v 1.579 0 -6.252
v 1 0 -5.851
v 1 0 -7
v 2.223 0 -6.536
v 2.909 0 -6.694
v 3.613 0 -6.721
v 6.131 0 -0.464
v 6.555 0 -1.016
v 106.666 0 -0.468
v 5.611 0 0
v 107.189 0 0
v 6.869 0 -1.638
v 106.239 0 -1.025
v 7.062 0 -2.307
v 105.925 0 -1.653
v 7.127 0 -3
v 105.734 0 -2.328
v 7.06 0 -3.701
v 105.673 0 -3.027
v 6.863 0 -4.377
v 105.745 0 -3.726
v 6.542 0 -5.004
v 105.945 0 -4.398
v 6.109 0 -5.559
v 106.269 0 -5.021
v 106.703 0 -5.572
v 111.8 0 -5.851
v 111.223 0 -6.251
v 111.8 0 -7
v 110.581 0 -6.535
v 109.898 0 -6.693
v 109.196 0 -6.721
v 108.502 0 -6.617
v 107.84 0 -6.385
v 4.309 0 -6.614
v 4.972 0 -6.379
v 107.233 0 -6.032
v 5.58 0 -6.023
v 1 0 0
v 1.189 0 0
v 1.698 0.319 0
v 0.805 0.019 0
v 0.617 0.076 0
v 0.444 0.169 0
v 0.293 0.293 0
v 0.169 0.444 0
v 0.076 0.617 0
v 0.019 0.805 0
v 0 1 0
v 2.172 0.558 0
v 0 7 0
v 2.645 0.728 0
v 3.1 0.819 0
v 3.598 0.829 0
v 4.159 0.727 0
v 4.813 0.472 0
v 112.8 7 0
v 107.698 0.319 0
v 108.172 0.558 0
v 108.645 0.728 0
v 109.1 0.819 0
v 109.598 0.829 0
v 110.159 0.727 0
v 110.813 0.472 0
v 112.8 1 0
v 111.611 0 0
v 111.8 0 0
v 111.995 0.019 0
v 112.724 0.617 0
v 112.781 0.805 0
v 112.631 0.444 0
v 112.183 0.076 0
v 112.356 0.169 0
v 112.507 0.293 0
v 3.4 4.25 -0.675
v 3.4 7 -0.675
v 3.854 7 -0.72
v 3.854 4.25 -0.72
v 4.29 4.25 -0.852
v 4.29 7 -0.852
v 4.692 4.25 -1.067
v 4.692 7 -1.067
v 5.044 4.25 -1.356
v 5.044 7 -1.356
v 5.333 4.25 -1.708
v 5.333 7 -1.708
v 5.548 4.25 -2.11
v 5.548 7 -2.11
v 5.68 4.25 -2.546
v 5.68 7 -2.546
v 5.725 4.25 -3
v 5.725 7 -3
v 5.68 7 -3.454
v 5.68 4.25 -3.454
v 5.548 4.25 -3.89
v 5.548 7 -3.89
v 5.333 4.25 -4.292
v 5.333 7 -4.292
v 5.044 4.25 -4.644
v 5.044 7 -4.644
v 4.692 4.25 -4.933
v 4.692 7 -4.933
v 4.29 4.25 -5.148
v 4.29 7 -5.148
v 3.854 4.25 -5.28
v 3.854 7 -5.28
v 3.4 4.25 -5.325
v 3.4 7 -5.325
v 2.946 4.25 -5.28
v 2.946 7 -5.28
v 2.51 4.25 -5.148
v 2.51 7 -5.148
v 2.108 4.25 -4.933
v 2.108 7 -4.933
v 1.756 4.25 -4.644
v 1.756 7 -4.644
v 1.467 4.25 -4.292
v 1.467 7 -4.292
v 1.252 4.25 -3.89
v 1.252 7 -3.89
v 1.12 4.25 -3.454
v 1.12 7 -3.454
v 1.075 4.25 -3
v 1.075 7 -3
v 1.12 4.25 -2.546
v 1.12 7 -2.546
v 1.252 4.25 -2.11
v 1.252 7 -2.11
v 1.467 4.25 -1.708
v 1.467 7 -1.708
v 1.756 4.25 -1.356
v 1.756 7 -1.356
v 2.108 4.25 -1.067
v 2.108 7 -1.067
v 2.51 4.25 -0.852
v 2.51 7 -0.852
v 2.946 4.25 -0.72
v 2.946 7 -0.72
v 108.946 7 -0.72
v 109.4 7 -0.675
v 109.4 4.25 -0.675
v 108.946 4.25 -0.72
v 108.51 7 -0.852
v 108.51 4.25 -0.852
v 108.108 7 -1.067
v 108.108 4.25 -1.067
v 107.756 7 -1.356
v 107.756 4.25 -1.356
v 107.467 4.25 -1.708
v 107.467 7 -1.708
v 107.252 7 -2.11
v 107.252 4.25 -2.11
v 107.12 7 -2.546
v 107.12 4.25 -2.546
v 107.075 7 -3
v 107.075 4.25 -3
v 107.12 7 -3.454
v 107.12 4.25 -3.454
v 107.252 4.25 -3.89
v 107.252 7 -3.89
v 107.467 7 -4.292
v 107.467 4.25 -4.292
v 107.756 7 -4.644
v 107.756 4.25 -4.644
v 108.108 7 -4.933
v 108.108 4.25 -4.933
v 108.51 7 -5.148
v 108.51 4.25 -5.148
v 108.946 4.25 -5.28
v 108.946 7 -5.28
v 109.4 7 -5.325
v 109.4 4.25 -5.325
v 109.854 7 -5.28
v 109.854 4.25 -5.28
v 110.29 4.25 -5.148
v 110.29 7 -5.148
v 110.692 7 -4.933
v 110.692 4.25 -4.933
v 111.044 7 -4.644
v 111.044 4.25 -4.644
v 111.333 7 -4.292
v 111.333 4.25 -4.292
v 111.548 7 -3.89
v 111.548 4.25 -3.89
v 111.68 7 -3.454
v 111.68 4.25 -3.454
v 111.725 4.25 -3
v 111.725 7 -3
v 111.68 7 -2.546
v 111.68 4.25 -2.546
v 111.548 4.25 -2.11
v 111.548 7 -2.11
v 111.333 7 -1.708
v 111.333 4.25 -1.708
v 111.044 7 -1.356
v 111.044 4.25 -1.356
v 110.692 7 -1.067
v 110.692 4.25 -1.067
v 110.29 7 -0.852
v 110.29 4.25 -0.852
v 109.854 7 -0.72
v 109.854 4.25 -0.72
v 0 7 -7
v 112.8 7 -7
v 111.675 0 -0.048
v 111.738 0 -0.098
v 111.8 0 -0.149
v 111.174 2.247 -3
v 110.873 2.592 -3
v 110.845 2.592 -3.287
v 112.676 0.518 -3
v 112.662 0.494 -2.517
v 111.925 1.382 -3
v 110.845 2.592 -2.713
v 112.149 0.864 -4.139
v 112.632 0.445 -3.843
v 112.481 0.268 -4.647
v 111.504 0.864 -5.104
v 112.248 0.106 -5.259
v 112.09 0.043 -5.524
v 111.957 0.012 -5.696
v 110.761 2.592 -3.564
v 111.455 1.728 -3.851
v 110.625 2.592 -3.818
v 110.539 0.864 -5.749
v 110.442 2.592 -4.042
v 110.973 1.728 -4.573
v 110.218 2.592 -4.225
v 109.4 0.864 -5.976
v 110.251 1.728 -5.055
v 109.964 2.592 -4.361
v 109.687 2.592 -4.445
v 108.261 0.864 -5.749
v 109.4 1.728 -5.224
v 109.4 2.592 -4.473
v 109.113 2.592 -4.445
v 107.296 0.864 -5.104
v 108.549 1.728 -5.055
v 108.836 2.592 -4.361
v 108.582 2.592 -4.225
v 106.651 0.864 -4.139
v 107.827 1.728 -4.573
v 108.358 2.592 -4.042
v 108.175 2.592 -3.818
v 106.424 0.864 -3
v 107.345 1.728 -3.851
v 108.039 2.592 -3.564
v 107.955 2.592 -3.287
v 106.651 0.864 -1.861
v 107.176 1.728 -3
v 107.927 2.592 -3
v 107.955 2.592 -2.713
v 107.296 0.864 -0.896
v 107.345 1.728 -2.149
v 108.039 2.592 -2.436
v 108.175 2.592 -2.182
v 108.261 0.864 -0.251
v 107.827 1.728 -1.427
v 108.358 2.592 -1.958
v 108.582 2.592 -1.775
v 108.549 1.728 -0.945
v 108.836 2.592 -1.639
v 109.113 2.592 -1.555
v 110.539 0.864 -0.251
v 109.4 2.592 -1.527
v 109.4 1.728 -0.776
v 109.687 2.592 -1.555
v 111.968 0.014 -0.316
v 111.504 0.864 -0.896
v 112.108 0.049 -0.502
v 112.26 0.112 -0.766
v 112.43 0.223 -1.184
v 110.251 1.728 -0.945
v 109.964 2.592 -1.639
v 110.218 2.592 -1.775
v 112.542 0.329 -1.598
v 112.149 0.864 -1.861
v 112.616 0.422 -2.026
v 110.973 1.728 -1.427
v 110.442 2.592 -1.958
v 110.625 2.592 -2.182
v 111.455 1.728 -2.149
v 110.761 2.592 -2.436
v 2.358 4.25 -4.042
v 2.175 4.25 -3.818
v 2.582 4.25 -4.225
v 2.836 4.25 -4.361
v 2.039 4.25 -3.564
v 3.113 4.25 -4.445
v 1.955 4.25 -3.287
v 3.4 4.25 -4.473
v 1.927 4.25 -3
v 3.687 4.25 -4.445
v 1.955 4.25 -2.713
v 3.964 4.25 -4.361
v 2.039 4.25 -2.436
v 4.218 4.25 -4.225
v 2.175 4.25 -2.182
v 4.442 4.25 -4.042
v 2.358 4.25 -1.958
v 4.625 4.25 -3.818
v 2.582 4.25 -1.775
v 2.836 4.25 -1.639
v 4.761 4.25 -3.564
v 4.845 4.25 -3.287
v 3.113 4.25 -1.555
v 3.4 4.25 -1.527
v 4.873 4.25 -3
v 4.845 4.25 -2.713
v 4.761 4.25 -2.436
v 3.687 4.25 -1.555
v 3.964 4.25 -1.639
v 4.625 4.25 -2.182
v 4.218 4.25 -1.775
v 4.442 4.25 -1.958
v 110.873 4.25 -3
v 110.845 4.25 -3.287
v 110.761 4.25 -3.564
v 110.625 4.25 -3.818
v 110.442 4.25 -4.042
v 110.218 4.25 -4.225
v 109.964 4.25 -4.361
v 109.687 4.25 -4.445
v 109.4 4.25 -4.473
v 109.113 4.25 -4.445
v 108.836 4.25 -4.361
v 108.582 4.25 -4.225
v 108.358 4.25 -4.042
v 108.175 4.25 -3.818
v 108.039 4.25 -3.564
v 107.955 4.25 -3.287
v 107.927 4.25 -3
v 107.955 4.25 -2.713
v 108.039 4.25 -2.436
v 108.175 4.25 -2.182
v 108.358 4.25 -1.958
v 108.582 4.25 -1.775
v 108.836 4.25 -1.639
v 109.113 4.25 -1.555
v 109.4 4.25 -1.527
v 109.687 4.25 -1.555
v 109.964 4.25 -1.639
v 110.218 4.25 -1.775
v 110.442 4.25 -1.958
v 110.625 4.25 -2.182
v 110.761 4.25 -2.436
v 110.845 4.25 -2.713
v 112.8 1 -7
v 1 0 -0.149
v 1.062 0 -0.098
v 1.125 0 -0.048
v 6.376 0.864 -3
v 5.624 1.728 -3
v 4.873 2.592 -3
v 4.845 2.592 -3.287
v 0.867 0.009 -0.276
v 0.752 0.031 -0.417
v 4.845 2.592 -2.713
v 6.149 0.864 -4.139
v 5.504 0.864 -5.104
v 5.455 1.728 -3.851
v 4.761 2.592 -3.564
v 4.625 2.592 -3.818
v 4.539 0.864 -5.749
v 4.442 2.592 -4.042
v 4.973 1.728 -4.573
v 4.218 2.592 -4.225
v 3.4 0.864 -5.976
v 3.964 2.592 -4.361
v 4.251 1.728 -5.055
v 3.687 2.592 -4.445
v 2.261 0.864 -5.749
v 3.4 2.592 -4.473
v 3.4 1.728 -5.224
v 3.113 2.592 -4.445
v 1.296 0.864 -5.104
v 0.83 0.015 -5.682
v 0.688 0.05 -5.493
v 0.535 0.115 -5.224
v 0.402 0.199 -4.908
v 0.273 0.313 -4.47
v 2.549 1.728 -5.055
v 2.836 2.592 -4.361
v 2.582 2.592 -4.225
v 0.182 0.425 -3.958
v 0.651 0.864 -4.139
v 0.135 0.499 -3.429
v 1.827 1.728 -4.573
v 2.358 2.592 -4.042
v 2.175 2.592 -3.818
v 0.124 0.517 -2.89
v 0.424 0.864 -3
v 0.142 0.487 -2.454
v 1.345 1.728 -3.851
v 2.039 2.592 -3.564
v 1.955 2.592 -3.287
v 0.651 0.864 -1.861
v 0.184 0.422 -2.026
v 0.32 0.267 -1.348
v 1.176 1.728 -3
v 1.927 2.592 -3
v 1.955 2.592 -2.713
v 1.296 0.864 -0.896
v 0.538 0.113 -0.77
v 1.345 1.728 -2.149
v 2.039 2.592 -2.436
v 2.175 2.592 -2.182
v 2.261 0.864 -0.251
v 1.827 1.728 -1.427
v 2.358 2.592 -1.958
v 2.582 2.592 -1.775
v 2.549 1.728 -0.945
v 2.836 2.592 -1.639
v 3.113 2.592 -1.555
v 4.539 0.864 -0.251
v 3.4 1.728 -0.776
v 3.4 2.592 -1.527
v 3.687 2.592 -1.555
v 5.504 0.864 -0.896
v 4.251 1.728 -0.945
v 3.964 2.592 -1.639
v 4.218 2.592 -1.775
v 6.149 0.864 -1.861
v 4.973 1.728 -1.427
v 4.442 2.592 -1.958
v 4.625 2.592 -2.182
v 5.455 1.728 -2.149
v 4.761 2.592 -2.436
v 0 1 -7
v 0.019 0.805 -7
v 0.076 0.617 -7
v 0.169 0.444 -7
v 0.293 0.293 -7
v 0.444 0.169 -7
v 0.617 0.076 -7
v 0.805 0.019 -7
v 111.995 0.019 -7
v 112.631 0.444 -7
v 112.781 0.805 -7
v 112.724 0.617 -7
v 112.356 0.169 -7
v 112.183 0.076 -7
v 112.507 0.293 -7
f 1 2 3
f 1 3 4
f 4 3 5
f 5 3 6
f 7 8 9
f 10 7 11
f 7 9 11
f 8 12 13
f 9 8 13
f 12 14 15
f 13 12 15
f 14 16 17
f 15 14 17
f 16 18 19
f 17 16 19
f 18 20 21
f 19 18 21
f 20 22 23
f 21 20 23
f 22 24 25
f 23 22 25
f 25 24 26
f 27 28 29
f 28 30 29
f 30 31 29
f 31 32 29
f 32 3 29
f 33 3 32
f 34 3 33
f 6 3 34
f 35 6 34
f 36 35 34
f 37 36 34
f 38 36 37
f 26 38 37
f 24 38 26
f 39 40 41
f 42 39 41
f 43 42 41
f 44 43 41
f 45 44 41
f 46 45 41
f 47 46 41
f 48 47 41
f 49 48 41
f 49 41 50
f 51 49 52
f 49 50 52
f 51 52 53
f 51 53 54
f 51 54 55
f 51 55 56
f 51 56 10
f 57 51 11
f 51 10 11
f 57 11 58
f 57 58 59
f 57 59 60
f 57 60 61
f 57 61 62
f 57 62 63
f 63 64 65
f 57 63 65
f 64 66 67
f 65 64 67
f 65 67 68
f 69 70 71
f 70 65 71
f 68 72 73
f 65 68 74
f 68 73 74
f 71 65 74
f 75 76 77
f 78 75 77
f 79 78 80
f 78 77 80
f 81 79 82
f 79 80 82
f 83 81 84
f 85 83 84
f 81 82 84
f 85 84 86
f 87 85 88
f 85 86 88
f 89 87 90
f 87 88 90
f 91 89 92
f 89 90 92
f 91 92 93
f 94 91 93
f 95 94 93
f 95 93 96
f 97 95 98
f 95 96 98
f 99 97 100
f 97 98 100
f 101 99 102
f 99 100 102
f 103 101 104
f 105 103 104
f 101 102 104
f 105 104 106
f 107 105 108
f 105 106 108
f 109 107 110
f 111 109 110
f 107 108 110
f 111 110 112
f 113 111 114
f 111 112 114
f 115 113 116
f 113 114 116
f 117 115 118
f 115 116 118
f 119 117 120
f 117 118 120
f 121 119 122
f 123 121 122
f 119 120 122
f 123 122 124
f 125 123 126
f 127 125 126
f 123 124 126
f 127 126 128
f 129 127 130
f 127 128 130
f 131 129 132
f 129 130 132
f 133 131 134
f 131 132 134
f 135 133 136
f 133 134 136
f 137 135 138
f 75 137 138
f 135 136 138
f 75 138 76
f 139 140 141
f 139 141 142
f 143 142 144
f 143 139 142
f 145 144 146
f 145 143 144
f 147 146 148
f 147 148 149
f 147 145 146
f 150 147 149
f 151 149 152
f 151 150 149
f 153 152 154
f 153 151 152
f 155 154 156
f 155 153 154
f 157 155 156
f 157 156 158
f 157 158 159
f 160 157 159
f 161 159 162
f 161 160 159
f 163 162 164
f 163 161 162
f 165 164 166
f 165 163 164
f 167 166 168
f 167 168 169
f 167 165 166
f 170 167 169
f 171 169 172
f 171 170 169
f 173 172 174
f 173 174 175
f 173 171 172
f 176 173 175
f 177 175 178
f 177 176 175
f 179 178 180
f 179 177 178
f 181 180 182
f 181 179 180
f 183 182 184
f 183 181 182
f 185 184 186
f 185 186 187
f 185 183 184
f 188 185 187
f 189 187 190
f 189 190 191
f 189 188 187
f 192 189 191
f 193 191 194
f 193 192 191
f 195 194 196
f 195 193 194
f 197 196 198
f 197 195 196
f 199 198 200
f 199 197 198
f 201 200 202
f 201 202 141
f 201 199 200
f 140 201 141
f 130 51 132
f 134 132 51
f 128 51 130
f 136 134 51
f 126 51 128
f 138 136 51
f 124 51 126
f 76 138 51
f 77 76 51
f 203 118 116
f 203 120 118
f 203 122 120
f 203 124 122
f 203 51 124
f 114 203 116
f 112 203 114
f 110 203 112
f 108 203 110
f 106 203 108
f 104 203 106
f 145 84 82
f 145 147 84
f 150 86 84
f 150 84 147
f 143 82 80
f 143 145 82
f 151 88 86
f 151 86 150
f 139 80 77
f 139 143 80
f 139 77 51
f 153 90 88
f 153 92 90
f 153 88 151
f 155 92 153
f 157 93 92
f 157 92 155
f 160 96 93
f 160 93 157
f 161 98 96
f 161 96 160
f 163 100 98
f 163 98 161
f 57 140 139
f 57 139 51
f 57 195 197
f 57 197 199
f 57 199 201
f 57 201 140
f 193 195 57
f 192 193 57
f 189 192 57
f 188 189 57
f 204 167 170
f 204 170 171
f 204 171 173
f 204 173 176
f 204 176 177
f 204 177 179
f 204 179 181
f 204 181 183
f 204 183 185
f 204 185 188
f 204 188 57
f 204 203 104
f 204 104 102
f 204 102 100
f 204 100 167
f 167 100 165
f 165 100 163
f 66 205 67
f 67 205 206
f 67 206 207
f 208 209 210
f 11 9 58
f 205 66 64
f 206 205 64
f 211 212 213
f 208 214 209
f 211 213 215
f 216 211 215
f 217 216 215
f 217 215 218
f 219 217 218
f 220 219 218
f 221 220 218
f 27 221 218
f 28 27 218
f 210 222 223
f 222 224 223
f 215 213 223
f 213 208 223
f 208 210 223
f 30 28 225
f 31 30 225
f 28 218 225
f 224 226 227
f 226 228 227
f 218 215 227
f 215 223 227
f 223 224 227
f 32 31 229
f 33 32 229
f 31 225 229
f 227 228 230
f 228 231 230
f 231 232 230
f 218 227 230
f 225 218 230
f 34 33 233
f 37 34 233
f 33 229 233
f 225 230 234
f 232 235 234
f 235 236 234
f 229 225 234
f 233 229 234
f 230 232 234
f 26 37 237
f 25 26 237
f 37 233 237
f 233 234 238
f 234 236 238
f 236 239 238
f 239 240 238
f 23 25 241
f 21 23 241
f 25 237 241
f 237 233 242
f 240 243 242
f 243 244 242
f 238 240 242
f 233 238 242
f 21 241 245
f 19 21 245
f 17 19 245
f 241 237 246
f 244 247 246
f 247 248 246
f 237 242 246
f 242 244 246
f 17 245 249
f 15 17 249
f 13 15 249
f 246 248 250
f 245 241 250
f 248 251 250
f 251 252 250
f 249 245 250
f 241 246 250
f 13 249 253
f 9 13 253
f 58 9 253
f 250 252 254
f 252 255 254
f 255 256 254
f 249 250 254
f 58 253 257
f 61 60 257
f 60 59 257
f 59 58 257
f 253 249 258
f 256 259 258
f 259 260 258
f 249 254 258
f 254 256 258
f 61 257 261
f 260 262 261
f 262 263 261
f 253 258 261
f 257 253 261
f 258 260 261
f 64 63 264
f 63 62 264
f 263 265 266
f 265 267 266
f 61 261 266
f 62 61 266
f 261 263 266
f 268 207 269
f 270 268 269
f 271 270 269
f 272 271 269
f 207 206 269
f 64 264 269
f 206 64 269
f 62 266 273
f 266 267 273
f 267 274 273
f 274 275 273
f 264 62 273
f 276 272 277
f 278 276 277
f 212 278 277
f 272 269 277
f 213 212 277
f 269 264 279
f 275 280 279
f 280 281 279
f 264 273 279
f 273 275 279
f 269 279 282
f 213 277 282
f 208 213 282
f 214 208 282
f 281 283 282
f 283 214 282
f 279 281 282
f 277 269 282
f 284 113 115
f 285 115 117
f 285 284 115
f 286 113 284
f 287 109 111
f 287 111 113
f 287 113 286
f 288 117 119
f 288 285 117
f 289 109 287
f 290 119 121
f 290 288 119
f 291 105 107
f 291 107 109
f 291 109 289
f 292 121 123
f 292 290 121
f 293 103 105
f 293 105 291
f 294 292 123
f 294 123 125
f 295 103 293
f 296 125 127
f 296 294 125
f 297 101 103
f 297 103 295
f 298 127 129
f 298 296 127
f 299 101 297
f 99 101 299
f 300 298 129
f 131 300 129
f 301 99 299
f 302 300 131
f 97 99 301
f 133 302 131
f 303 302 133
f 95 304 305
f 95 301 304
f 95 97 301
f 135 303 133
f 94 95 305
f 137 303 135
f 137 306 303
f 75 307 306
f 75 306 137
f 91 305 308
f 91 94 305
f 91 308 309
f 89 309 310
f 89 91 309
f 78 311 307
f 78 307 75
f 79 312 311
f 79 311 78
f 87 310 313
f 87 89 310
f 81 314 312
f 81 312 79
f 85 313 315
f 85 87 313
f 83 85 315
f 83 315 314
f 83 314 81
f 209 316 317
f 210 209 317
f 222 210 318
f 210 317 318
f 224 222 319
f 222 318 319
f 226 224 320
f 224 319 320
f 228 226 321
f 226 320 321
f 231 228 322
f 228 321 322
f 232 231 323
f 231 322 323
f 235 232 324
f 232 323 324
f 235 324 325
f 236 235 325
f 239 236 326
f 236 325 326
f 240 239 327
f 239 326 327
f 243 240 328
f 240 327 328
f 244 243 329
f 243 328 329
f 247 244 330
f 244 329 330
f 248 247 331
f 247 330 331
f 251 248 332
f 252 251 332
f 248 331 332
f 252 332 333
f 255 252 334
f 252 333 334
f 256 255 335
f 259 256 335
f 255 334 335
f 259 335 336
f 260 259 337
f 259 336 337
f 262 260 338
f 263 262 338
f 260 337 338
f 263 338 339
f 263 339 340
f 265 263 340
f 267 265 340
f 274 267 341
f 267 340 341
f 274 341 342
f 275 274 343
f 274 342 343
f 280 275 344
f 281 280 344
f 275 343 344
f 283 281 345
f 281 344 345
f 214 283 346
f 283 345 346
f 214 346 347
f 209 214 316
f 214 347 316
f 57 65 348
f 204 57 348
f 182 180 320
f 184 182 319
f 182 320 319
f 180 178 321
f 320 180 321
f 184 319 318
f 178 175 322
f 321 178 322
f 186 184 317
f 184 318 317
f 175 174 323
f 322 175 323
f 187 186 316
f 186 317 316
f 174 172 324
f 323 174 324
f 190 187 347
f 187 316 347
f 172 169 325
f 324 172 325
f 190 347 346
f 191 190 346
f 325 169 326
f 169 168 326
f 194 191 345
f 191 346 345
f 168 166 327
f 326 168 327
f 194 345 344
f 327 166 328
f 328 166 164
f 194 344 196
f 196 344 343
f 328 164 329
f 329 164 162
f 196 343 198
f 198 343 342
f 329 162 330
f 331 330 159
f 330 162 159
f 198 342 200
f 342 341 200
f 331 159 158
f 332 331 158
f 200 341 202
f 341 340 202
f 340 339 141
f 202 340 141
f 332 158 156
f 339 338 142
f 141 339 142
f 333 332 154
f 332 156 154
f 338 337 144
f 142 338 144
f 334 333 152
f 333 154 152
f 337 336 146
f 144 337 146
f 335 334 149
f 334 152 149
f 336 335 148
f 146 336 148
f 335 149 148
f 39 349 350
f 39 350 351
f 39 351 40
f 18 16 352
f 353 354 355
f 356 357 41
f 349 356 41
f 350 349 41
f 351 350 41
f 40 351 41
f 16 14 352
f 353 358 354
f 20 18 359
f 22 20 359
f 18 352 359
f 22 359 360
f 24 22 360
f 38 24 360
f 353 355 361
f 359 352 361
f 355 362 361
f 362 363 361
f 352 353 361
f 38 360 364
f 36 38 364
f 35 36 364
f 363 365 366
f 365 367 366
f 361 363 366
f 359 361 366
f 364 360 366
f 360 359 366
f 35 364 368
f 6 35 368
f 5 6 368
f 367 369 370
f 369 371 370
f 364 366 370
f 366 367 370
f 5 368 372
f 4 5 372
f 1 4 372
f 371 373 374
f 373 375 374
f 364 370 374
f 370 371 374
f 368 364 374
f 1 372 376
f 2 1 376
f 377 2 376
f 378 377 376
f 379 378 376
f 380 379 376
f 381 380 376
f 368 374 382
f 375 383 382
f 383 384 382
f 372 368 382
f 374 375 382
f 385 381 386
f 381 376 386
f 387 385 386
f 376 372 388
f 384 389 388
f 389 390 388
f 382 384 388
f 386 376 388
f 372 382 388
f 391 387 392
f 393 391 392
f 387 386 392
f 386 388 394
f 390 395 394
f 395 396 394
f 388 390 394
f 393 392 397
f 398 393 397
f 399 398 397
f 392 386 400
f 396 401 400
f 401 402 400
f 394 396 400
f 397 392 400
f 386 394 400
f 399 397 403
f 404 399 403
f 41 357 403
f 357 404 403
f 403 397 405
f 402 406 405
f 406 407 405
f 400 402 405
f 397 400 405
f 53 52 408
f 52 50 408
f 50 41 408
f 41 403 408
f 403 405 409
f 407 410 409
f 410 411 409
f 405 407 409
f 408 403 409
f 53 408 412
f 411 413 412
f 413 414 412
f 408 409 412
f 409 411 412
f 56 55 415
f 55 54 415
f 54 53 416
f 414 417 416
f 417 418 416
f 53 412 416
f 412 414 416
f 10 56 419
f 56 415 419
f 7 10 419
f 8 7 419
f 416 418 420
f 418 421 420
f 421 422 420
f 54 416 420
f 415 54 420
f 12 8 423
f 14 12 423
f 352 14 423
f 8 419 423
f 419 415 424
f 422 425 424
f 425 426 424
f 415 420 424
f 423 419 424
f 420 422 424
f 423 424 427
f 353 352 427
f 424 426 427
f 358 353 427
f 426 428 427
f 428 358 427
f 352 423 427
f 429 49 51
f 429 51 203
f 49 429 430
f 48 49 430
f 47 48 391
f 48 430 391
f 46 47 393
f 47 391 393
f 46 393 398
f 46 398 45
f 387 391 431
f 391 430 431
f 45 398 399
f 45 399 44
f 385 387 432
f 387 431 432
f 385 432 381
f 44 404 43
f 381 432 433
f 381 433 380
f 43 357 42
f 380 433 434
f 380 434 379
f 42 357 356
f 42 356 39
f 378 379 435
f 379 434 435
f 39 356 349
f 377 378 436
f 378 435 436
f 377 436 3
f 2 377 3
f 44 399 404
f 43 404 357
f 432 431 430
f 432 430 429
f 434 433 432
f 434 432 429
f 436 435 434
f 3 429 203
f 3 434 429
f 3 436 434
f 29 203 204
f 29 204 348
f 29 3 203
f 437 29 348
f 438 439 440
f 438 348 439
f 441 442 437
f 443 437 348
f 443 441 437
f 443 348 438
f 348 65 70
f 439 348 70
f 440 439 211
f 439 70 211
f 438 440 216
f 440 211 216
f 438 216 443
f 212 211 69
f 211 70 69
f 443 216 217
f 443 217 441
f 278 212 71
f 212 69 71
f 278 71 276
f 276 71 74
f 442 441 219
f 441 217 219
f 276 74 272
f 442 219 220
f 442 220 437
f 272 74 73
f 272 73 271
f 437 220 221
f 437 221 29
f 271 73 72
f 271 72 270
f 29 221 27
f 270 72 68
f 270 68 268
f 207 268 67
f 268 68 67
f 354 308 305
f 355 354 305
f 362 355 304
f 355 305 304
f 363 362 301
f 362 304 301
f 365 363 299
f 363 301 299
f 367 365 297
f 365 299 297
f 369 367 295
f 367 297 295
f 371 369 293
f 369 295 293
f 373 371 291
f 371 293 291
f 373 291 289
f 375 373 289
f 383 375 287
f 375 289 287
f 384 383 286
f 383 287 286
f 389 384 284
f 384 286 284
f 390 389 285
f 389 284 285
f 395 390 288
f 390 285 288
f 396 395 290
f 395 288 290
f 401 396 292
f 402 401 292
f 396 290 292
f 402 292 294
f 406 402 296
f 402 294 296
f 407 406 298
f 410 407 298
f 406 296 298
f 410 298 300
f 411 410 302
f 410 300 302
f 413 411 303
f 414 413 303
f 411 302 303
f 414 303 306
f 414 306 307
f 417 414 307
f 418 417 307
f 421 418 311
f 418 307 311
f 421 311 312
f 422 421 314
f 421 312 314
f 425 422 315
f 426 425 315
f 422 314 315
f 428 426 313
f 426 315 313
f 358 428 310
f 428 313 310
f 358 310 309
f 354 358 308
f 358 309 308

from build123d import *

# Parameters (mm, degrees)
SKETCH1_W                                      = 112.8
SKETCH1_H                                      = 7
BOSS_EXTRUDE1_DEPTH                            = 7
CSK_FOR_4_FLAT_HEAD_MACHINE_SCREW1_D           = 2.9464
CSK_FOR_4_FLAT_HEAD_MACHINE_SCREW1_CSINK_D     = 7.4535792
CSK_FOR_4_FLAT_HEAD_MACHINE_SCREW1_CSINK_ANGLE = 82
FILLET1_R                                      = 1
SKETCH5_R                                      = 2.325
F_4_40_REGISTRATION_HOLE_DEPTH                 = 2.75


with BuildPart() as part:
    # Sketch1 → Boss-Extrude1 (new body)
    with BuildSketch(Plane(origin=(0, 0, 0), x_dir=(1, 0, 0), z_dir=(0, 1, 0))):
        with Locations((56.4, 3.5)):
            Rectangle(SKETCH1_W, SKETCH1_H)
    extrude(amount=BOSS_EXTRUDE1_DEPTH)

    # CSK for #4 Flat Head Machine Screw1 (through all)
    with Locations(Plane(origin=(0, 0, 0), x_dir=(-1, 0, 0), z_dir=(0, -1, 0))):
        with Locations((-109.4, 3), (-3.4, 3)):
            CounterSinkHole(CSK_FOR_4_FLAT_HEAD_MACHINE_SCREW1_D / 2, CSK_FOR_4_FLAT_HEAD_MACHINE_SCREW1_CSINK_D / 2, counter_sink_angle=CSK_FOR_4_FLAT_HEAD_MACHINE_SCREW1_CSINK_ANGLE)

    # Fillet1
    # the kernel refuses this fillet: 1 mm, written as the material it takes off along each edge
    with BuildSketch(Plane(origin=(0, 0, -9.5), x_dir=(0, 1, 0), z_dir=(0, 0, 1)), Plane(origin=(112.8, 0, -2.026093288), x_dir=(0, 1, 0), z_dir=(0, 0, -1))) as fillet1_piece_1:
        with BuildLine():
            CenterArc((FILLET1_R, -FILLET1_R), FILLET1_R, 90, 90)
            Line((0, -FILLET1_R), (0, 0))
            Line((0, 0), (FILLET1_R, 0))
        make_face()
    extrude(amount=7.473906712, mode=Mode.SUBTRACT)
    with BuildSketch(Plane(origin=(0, 0, -3.973906712), x_dir=(0, 1, 0), z_dir=(0, 0, 1)), Plane(origin=(112.8, 0, 2.5), x_dir=(0, 1, 0), z_dir=(0, 0, -1))) as fillet1_piece_2:
        with BuildLine():
            CenterArc((FILLET1_R, -FILLET1_R), FILLET1_R, 90, 90)
            Line((0, -FILLET1_R), (0, 0))
            Line((0, 0), (FILLET1_R, 0))
        make_face()
    extrude(amount=6.473906712, mode=Mode.SUBTRACT)

    # Sketch5 → 4-40 registration hole (cut)
    with BuildSketch(Plane(origin=(0, 7, 0), x_dir=(1, 0, 0), z_dir=(0, 1, 0))):
        with Locations(Location((3.4, 3, 0), (0, 0, 270))):
            Circle(SKETCH5_R)
    f_4_40_registration_hole = extrude(amount=-F_4_40_REGISTRATION_HOLE_DEPTH, mode=Mode.SUBTRACT)

    # Mirror1: 4-40 registration hole across plane
    add(f_4_40_registration_hole.mirror(Plane(origin=(56.4, 0, 0), x_dir=(0, 0, 1), z_dir=(1, 0, 0))), mode=Mode.SUBTRACT)


solid = part.part
